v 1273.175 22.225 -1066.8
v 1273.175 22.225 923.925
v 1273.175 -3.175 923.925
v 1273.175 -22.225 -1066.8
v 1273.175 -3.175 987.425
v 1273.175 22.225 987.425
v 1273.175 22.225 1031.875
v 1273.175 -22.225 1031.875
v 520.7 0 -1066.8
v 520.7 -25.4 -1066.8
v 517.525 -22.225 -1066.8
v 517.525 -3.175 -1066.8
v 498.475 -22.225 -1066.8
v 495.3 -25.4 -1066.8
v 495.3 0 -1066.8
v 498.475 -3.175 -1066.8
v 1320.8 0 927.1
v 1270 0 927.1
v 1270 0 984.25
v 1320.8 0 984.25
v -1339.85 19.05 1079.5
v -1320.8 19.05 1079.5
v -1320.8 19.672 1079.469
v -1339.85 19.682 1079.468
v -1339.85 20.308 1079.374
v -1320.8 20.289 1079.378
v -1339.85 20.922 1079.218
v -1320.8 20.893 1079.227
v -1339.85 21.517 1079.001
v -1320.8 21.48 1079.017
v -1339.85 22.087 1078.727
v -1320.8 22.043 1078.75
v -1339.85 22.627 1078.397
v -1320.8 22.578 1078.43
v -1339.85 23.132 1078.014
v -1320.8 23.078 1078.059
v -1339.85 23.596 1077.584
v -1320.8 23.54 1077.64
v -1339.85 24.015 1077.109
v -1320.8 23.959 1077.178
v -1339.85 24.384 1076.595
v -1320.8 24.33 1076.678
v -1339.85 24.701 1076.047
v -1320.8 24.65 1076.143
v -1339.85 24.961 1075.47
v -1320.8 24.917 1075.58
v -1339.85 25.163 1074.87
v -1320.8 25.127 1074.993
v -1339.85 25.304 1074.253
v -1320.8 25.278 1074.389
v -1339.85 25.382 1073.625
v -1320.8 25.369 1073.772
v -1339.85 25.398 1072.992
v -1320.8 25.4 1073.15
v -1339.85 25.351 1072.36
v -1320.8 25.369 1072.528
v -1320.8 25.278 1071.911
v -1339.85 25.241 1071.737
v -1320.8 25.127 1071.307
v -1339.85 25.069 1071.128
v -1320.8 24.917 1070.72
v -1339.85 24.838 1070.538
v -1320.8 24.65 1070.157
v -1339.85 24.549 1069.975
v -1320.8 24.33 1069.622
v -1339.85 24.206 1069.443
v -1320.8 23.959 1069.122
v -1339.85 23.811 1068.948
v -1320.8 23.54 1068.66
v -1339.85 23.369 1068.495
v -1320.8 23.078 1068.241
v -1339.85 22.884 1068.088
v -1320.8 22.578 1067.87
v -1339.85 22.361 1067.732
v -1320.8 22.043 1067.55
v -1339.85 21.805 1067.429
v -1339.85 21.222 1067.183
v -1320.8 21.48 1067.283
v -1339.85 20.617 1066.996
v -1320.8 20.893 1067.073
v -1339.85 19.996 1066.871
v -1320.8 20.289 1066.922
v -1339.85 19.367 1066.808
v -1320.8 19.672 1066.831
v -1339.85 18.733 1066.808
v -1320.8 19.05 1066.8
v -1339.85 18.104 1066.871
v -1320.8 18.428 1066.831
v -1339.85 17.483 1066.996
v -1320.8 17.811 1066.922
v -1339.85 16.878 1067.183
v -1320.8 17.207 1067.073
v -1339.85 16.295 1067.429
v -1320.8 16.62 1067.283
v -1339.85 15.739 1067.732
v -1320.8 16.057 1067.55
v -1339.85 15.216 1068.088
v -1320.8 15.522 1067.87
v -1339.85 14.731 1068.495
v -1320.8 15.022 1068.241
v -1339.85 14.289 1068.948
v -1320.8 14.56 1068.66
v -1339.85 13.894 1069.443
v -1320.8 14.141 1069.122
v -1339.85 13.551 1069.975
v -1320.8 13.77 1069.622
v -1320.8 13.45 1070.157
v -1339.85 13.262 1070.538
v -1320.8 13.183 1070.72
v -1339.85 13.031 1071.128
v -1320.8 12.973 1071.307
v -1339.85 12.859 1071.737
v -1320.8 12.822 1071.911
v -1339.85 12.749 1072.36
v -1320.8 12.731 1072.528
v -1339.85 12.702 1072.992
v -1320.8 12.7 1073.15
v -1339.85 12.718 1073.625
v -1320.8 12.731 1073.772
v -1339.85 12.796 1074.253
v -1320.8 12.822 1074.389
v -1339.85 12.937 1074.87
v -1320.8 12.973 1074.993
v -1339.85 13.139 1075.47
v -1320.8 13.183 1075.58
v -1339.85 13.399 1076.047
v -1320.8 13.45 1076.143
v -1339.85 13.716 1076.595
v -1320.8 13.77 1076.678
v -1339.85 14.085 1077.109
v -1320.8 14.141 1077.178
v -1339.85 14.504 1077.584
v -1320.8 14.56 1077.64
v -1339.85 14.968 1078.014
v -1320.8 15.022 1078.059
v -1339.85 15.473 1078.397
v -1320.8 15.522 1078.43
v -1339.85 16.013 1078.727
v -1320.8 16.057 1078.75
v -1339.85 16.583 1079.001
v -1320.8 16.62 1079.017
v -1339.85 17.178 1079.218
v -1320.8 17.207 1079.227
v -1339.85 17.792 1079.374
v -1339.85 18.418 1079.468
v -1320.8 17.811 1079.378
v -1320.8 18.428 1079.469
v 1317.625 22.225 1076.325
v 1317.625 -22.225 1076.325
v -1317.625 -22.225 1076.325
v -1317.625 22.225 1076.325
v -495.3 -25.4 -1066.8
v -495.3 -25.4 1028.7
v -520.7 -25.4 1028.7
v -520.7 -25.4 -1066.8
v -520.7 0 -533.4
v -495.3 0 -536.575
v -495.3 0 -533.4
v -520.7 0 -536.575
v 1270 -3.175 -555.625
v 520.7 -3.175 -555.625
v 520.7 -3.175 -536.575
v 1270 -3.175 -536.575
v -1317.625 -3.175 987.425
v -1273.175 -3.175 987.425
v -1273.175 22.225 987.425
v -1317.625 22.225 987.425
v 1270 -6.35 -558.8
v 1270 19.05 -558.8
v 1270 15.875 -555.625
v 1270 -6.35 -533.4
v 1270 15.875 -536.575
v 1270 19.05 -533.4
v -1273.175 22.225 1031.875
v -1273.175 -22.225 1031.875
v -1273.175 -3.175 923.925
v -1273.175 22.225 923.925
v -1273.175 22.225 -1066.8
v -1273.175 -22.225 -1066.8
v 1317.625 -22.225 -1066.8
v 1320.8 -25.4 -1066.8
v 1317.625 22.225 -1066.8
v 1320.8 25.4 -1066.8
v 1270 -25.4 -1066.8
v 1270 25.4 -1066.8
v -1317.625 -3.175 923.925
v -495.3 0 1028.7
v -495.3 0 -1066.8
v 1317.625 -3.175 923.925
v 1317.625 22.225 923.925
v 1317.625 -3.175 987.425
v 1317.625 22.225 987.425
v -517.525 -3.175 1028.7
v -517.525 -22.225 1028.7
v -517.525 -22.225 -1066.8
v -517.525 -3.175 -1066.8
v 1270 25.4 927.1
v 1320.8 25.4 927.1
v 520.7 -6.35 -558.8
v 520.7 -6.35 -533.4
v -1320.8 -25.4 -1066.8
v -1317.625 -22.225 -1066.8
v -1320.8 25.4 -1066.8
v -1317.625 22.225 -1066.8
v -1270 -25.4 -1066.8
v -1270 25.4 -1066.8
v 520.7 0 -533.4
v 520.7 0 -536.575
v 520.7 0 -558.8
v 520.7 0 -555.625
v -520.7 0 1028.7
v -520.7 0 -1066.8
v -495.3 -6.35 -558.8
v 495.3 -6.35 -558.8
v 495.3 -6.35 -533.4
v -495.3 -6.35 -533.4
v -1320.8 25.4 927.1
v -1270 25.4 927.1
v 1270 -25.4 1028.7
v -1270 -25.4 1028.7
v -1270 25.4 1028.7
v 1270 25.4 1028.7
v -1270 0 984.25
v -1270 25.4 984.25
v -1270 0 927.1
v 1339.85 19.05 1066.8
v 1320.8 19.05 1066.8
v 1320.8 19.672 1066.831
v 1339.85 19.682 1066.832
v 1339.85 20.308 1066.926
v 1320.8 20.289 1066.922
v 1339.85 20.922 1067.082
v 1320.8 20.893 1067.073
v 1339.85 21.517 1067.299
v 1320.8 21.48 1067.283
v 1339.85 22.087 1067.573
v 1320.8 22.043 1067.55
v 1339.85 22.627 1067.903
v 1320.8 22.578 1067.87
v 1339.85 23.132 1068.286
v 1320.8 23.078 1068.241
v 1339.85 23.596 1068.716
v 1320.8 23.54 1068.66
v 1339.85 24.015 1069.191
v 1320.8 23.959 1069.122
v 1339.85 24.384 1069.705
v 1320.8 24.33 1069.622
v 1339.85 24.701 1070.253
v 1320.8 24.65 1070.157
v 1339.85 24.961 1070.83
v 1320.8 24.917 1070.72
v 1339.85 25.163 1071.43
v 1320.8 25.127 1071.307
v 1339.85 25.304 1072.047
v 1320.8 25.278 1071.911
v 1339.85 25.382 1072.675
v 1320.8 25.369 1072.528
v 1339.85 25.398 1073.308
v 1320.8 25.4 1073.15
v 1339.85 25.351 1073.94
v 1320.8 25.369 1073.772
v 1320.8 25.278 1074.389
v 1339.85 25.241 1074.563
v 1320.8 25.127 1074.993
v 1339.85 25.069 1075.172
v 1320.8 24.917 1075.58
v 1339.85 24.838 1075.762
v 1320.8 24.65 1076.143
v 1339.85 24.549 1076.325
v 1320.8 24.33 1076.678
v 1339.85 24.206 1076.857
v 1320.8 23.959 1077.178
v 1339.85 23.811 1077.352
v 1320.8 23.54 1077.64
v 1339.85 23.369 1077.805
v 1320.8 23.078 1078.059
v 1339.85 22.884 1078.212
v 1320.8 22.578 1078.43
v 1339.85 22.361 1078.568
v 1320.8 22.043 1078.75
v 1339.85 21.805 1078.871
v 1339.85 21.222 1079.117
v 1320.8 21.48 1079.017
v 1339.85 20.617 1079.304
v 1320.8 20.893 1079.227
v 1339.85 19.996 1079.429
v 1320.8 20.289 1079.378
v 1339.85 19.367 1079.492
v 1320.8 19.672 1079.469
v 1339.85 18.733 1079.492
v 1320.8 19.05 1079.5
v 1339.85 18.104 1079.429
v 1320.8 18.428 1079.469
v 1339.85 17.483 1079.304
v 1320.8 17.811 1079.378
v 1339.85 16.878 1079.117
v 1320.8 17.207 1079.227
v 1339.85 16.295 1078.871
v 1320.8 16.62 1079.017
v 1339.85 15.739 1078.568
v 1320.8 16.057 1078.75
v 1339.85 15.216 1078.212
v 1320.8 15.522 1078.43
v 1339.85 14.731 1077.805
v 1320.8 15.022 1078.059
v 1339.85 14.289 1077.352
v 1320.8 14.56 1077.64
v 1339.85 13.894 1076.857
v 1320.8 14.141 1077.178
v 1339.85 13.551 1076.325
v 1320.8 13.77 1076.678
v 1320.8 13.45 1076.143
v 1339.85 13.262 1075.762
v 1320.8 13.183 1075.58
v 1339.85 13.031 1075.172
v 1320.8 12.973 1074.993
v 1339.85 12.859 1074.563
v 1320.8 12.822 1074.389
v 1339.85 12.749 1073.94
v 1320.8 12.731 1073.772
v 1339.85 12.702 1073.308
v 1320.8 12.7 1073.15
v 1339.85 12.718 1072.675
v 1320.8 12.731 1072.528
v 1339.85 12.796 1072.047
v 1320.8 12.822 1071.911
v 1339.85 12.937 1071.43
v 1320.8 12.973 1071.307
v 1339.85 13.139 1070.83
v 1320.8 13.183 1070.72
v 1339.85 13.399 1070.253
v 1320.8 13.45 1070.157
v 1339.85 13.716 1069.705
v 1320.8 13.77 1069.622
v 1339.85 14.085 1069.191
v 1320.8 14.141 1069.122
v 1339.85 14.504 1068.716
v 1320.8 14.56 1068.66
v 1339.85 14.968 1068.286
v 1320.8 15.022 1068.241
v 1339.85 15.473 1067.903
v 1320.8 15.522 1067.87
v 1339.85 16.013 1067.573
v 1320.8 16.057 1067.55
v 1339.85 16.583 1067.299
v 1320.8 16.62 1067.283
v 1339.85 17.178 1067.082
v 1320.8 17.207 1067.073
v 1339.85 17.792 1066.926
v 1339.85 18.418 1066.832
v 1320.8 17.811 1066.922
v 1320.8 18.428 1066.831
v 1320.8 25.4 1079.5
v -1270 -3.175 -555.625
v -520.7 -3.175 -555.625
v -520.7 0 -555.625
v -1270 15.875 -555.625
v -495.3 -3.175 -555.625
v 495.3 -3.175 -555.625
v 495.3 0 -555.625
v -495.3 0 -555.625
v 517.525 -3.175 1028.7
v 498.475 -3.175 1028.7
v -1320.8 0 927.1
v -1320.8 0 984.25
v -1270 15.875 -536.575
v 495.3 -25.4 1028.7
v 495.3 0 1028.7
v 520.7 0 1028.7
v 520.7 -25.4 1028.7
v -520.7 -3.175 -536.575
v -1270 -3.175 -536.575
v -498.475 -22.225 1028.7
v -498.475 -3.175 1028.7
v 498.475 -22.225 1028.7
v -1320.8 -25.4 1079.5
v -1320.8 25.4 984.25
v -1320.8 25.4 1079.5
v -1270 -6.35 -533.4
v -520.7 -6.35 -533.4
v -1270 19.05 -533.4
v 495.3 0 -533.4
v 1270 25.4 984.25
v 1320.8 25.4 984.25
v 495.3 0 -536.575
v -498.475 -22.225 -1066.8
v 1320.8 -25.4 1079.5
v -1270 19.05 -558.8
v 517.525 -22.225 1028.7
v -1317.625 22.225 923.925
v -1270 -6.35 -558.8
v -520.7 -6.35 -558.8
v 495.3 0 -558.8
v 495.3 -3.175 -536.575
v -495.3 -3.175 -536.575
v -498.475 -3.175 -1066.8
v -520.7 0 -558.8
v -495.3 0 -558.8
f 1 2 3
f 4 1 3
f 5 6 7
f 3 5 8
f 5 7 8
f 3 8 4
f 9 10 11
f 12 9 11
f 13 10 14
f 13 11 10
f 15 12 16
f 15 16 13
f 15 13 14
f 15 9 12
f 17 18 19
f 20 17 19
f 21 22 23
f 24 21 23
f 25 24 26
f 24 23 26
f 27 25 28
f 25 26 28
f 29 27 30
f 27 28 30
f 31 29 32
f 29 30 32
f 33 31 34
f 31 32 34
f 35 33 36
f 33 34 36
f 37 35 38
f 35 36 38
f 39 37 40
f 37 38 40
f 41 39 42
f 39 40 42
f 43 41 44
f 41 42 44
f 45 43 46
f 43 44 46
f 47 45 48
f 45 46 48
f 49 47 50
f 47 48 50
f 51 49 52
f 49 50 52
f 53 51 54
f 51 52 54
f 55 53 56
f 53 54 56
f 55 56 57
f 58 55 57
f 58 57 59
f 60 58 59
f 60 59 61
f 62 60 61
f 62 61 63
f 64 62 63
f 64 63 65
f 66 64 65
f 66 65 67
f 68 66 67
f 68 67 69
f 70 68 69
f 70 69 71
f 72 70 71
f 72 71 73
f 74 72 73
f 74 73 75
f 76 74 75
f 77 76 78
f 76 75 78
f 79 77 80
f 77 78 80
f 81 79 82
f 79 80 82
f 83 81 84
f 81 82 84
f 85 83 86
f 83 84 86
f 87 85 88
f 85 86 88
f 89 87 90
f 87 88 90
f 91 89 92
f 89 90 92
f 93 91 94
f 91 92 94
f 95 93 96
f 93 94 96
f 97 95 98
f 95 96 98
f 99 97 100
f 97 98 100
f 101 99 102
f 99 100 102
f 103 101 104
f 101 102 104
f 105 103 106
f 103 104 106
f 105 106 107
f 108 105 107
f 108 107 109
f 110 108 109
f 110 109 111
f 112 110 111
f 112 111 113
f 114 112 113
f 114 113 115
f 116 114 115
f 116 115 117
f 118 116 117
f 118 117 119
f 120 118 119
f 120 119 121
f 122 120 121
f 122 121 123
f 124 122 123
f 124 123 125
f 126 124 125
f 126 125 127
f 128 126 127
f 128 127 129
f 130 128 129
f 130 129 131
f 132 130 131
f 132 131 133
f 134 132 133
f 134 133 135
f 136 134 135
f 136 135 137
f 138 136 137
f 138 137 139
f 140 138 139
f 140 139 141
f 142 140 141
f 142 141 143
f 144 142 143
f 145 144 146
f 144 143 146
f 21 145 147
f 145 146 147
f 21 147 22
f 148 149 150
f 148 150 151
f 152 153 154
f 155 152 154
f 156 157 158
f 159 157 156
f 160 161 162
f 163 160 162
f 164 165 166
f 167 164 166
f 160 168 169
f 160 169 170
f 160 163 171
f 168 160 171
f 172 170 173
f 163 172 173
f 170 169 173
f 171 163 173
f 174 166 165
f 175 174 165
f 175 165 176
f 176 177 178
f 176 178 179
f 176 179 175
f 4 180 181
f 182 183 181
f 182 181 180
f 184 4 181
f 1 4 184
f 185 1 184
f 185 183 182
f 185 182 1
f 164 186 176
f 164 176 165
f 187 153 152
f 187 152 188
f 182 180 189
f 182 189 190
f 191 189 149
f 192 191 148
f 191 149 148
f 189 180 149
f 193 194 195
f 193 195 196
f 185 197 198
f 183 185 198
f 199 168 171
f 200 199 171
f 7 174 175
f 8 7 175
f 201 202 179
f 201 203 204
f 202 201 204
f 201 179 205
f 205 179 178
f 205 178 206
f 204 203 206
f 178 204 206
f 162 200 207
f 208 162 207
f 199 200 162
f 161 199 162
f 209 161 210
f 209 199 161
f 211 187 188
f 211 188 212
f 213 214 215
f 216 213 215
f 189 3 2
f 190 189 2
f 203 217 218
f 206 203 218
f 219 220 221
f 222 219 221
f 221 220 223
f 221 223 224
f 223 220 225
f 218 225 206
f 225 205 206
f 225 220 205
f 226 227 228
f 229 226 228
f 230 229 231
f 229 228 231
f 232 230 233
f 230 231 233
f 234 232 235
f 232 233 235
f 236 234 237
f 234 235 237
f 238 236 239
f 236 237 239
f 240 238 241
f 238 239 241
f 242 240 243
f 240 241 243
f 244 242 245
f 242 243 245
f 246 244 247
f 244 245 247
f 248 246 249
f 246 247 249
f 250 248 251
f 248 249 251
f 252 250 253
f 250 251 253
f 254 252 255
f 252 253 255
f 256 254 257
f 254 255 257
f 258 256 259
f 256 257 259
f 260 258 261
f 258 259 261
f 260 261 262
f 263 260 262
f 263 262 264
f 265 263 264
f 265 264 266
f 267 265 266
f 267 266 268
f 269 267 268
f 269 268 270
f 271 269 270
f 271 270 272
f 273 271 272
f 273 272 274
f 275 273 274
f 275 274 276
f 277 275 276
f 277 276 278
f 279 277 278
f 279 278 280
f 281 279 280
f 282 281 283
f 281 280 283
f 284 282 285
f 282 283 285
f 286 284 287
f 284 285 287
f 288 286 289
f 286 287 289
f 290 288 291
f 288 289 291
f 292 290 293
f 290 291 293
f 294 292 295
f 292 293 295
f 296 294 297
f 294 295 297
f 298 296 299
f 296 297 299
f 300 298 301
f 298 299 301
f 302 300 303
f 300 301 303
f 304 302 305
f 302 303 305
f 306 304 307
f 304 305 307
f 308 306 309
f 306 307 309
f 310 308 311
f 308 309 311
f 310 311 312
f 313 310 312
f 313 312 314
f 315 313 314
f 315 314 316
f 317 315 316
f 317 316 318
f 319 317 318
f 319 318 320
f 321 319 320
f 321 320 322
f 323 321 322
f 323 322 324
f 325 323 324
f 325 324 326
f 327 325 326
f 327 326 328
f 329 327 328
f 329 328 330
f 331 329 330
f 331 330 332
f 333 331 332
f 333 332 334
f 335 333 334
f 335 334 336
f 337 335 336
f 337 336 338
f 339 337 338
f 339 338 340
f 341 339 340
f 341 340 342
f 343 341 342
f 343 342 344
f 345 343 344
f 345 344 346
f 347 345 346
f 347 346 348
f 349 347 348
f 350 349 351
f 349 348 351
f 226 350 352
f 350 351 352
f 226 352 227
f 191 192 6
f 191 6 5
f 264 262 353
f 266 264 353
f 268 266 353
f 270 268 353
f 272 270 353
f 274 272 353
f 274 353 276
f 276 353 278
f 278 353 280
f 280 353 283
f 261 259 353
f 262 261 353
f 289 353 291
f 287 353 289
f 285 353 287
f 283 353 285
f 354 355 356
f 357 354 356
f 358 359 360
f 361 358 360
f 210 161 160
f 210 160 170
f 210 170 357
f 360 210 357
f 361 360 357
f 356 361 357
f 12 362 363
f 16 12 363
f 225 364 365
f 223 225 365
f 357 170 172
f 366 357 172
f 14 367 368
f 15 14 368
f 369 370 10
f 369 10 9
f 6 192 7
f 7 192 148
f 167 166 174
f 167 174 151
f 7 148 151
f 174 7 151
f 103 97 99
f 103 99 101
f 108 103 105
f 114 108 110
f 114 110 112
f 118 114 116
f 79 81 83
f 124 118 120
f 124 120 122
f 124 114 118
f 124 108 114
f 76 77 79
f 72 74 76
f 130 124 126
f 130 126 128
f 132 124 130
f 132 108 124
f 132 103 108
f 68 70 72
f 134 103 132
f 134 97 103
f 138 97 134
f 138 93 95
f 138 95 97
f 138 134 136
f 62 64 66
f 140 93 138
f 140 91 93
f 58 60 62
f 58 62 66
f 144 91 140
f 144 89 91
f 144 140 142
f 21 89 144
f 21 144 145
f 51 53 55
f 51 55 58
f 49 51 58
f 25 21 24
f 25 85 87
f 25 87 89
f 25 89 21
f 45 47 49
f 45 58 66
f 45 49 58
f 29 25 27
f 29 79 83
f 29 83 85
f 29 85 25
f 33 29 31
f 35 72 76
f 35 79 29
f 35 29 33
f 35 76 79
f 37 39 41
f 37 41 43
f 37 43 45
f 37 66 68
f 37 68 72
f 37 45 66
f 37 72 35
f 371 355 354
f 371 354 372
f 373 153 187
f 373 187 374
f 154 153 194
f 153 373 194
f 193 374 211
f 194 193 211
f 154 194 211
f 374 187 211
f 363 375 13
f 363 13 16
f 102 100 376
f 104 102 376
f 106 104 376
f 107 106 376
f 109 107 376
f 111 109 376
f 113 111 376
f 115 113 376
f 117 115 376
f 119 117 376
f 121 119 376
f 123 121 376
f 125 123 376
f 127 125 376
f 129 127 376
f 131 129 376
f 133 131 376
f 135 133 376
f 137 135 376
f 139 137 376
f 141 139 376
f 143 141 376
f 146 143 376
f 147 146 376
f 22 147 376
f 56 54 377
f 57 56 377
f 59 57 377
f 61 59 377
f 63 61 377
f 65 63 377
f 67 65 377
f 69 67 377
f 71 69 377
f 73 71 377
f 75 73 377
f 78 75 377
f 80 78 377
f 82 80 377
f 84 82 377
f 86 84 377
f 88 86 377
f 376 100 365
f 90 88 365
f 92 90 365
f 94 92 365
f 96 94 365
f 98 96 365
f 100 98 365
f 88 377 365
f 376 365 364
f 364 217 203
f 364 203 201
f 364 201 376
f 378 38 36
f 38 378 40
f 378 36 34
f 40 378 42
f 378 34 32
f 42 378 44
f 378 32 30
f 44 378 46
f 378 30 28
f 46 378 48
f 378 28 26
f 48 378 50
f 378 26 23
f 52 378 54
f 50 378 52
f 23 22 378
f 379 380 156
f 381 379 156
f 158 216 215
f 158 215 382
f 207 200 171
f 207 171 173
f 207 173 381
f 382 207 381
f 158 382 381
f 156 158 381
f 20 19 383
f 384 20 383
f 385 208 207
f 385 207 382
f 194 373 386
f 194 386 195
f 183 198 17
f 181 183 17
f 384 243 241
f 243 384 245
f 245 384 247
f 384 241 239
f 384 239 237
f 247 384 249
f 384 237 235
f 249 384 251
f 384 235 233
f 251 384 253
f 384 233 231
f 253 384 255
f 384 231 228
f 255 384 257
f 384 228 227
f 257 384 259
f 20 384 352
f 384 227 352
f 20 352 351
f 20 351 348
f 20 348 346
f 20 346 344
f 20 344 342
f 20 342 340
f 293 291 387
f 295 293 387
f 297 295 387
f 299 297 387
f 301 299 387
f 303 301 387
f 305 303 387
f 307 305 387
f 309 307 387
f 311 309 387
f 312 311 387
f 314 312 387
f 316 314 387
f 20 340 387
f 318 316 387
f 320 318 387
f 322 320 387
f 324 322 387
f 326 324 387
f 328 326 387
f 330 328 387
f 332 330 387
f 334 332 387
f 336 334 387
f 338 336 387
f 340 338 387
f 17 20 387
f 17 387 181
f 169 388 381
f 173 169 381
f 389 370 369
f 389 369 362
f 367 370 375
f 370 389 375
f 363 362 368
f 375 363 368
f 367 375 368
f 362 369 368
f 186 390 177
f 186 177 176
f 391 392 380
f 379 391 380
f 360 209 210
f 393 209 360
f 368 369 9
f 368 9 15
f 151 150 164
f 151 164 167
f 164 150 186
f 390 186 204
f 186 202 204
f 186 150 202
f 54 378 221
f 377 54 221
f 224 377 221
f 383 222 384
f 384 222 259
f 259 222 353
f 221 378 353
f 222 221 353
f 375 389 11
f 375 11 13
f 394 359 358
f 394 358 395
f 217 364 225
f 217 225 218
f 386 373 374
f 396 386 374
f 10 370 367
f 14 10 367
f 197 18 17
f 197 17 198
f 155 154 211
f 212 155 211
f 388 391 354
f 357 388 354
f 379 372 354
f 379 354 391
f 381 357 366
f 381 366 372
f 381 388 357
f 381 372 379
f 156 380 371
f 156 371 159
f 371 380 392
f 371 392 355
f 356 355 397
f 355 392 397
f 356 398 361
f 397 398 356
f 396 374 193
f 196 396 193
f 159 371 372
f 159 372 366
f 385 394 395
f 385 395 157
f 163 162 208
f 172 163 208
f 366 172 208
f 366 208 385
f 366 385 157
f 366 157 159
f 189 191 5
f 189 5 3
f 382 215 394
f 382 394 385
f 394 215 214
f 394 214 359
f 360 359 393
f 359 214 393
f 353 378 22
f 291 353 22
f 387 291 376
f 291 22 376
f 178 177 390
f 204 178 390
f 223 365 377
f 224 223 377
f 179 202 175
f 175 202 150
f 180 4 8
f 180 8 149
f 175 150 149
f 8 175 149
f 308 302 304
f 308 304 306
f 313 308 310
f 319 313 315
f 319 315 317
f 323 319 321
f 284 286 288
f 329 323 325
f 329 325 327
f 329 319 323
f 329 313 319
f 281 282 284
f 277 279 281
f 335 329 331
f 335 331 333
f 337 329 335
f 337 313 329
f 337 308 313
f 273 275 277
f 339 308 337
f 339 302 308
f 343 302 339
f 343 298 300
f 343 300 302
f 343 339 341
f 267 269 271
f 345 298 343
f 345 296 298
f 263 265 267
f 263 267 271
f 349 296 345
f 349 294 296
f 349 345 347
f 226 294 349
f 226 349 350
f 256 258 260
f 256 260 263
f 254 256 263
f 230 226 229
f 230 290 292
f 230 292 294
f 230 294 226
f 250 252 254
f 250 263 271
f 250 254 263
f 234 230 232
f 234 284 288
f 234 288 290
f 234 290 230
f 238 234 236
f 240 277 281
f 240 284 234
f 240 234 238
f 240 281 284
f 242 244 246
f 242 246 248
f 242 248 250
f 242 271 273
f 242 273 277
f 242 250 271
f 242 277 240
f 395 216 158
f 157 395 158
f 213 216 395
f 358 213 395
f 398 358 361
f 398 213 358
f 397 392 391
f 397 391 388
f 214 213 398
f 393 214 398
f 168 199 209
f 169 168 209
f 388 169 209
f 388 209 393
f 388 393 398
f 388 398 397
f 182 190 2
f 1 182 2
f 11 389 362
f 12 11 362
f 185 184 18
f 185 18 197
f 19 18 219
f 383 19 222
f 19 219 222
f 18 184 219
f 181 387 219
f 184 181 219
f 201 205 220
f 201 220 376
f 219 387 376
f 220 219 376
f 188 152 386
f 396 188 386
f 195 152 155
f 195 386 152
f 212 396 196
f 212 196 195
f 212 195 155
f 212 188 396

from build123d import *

# Parameters (mm, degrees)
SKETCH2_W             = 50.8
SKETCH2_H             = 50.8
SKETCH2_W_2           = 44.45
SKETCH2_H_2           = 44.45
SKETCH6_R             = 6.35
BOSS_EXTRUDE3_DEPTH   = 19.05
SKETCH12_R            = 6.35
BOSS_EXTRUDE6_DEPTH   = 19.05
SKETCH13_W            = 57.15
SKETCH13_H            = 25.4
CUT_EXTRUDE2_DEPTH    = 2641.6
SKETCH14_W            = 25.4
SKETCH14_H            = 25.4
SKETCH14_W_2          = 19.05
SKETCH14_H_2          = 19.05
BOSS_EXTRUDE7_DEPTH   = 2540
SKETCH16_W            = 25.4
SKETCH16_H            = 6.35
CUT_EXTRUDE3_DEPTH    = 25.4
SKETCH15_W            = 25.4
SKETCH15_H            = 25.4
SKETCH15_W_2          = 19.05
SKETCH15_H_2          = 19.05
BOSS_EXTRUDE9_DEPTH   = 2095.5
BOSS_EXTRUDE9_2_DEPTH = 2095.5
BOSS_EXTRUDE10_DEPTH  = 50.8
BOSS_EXTRUDE11_DEPTH  = 50.8


with BuildPart() as part:
    # Sweep1: sweep along a path in Sketch1
    with BuildLine(Plane(origin=(0, 0, 0), x_dir=(1, 0, 0), z_dir=(0, 1, 0))) as sweep1_path:
        Line((1308.1, 1066.8), (1308.1, -1066.8))
        Line((1308.1, -1066.8), (-1308.1, -1066.8))
        Line((-1308.1, -1066.8), (-1308.1, 1066.8))
    # Sketch2 → Sweep1 (sweep)
    with BuildSketch(Plane.XY):
        with Locations((-1295.4, 0)):
            Rectangle(SKETCH2_W, SKETCH2_H)
        with Locations((-1295.4, 0)):
            Rectangle(SKETCH2_W_2, SKETCH2_H_2, mode=Mode.SUBTRACT)
    sweep(path=sweep1_path.line, transition=Transition.RIGHT)

    # Sketch6 → Boss-Extrude3 (add)
    with BuildSketch(Plane.ZY.offset(1320.8)):
        with Locations((1073.15, 19.05)):
            Circle(SKETCH6_R)
    extrude(amount=BOSS_EXTRUDE3_DEPTH)

    # Sketch12 → Boss-Extrude6 (add)
    with BuildSketch(Plane(origin=(1320.8, 0, 0), x_dir=(0, 0, -1), z_dir=(1, 0, 0))):
        with Locations((-1073.15, 19.05)):
            Circle(SKETCH12_R)
    extrude(amount=BOSS_EXTRUDE6_DEPTH)

    # Sketch13 → Cut-Extrude2 (cut)
    with BuildSketch(Plane.ZY.offset(1320.8)):
        with Locations((955.675, 12.7)):
            Rectangle(SKETCH13_W, SKETCH13_H)
    extrude(amount=-CUT_EXTRUDE2_DEPTH, mode=Mode.SUBTRACT)

    # Sketch17 → Boss-Extrude10 (add)
    with BuildSketch(Plane(origin=(1320.8, 0, 0), x_dir=(0, 0, -1), z_dir=(1, 0, 0))):
        Polygon((-984.25, 25.4), (-987.425, 25.4), (-987.425, -3.175), (-923.925, -3.175), (-923.925, 25.4), (-927.1, 25.4), (-927.1, 0), (-984.25, 0), align=None)
    extrude(amount=-BOSS_EXTRUDE10_DEPTH)

    # Sketch18 → Boss-Extrude11 (add)
    with BuildSketch(Plane.ZY.offset(1320.8)):
        Polygon((927.1, 25.4), (923.925, 25.4), (923.925, -3.175), (987.425, -3.175), (987.425, 25.4), (984.25, 25.4), (984.25, 0), (927.1, 0), align=None)
    extrude(amount=-BOSS_EXTRUDE11_DEPTH)


with BuildPart() as body_2:
    # Sketch14 → Boss-Extrude7 (new body)
    with BuildSketch(Plane.ZY.offset(-1270)):
        with Locations((-546.1, 6.35)):
            Rectangle(SKETCH14_W, SKETCH14_H)
        with Locations((-546.1, 6.35)):
            Rectangle(SKETCH14_W_2, SKETCH14_H_2, mode=Mode.SUBTRACT)
    extrude(amount=BOSS_EXTRUDE7_DEPTH)

    # Sketch16 → Cut-Extrude3 (cut)
    with BuildSketch(Plane(origin=(0, 0, -558.8), x_dir=(-1, 0, 0), z_dir=(0, 0, -1))):
        with Locations((-508, -3.175)):
            Rectangle(SKETCH16_W, SKETCH16_H)
        with Locations((508, -3.175)):
            Rectangle(SKETCH16_W, SKETCH16_H)
    extrude(amount=-CUT_EXTRUDE3_DEPTH, mode=Mode.SUBTRACT)


with BuildPart() as body_3:
    # Sketch15 → Boss-Extrude9 (new body)
    with BuildSketch(Plane(origin=(0, 0, 1028.7), x_dir=(-1, 0, 0), z_dir=(0, 0, -1))):
        with Locations((-508, -12.7)):
            Rectangle(SKETCH15_W, SKETCH15_H)
        with Locations((-508, -12.7)):
            Rectangle(SKETCH15_W_2, SKETCH15_H_2, mode=Mode.SUBTRACT)
    extrude(amount=BOSS_EXTRUDE9_DEPTH)


with BuildPart() as body_4:
    # Sketch15 → Boss-Extrude9 2 (new body)
    with BuildSketch(Plane(origin=(0, 0, 1028.7), x_dir=(-1, 0, 0), z_dir=(0, 0, -1))):
        with Locations((508, -12.7)):
            Rectangle(SKETCH15_W, SKETCH15_H)
        with Locations((508, -12.7)):
            Rectangle(SKETCH15_W_2, SKETCH15_H_2, mode=Mode.SUBTRACT)
    extrude(amount=BOSS_EXTRUDE9_2_DEPTH)


solid = Compound([part.part, body_2.part, body_3.part, body_4.part])
